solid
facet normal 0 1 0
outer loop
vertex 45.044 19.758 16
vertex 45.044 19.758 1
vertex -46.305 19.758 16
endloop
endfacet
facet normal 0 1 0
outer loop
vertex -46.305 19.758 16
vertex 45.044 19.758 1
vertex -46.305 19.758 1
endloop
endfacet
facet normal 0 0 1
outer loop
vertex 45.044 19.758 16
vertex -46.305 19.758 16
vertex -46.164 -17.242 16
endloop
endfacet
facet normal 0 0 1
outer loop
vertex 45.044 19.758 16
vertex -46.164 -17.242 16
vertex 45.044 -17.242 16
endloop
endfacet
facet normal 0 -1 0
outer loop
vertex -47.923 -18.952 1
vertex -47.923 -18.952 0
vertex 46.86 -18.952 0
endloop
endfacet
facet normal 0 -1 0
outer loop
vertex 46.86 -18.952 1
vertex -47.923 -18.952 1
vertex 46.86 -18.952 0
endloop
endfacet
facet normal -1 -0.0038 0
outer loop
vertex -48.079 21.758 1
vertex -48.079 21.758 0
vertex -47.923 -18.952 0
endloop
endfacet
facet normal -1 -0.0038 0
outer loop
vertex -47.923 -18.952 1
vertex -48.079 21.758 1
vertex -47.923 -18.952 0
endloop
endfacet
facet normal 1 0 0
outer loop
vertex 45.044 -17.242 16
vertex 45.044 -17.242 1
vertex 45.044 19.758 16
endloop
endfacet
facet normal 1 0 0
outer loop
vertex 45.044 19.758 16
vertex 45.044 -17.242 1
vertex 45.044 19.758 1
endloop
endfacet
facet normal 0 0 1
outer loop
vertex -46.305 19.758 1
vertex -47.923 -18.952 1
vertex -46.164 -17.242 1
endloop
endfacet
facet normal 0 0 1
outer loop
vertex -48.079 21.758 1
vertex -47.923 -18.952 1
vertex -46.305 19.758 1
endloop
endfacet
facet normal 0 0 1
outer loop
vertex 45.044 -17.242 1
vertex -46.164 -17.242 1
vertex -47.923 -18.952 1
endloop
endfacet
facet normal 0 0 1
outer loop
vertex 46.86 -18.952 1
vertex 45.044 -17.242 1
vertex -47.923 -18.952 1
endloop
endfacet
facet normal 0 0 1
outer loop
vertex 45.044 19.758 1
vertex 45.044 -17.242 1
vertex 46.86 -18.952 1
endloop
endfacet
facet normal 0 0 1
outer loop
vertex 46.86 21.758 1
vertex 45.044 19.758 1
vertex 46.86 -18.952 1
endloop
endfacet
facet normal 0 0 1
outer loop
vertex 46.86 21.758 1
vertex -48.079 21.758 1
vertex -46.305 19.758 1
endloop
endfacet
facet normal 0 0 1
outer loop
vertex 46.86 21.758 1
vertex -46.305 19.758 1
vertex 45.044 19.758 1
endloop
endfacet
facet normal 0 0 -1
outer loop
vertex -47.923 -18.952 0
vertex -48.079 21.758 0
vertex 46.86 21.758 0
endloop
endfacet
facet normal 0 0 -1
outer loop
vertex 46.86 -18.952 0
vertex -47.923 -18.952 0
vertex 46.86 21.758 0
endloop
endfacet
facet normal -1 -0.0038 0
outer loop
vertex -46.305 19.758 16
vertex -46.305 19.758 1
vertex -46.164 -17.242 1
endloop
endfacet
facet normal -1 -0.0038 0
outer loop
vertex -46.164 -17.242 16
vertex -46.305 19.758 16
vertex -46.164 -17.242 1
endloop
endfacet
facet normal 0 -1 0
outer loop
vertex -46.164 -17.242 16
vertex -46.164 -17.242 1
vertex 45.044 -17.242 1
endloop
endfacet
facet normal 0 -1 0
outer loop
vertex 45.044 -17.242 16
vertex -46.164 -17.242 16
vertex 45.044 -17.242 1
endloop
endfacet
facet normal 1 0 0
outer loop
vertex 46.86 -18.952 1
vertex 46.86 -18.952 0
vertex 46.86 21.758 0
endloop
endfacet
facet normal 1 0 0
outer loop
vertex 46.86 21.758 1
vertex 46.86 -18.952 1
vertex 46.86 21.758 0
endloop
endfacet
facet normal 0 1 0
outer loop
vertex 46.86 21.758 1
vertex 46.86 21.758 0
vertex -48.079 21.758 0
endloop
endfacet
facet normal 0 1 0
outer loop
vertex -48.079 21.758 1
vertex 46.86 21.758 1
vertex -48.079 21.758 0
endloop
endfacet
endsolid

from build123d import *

# Parameters (mm, degrees)
F1_DEPTH = 16
F2_DEPTH = 1


with BuildPart() as f1:
    # F0 (on Top) → F1 (new body)
    with BuildSketch(Plane.XY):
        Polygon((-46.304833, 19.758051), (-46.163612, -17.241679), (45.044052, -17.241949), (45.044052, 19.758051), align=None)
    extrude(amount=F1_DEPTH)

    # F0 (on Top) → F2 (join)
    with BuildSketch(Plane.XY):
        Polygon((46.859896, 21.758051), (-48.0788, 21.758051), (-47.923417, -18.952159), (46.859896, -18.952159), align=None)
        Polygon((45.044052, -17.241949), (-46.163612, -17.241679), (-46.304833, 19.758051), (45.044052, 19.758051), align=None, mode=Mode.SUBTRACT)
    extrude(amount=F2_DEPTH)


solid = f1.part
